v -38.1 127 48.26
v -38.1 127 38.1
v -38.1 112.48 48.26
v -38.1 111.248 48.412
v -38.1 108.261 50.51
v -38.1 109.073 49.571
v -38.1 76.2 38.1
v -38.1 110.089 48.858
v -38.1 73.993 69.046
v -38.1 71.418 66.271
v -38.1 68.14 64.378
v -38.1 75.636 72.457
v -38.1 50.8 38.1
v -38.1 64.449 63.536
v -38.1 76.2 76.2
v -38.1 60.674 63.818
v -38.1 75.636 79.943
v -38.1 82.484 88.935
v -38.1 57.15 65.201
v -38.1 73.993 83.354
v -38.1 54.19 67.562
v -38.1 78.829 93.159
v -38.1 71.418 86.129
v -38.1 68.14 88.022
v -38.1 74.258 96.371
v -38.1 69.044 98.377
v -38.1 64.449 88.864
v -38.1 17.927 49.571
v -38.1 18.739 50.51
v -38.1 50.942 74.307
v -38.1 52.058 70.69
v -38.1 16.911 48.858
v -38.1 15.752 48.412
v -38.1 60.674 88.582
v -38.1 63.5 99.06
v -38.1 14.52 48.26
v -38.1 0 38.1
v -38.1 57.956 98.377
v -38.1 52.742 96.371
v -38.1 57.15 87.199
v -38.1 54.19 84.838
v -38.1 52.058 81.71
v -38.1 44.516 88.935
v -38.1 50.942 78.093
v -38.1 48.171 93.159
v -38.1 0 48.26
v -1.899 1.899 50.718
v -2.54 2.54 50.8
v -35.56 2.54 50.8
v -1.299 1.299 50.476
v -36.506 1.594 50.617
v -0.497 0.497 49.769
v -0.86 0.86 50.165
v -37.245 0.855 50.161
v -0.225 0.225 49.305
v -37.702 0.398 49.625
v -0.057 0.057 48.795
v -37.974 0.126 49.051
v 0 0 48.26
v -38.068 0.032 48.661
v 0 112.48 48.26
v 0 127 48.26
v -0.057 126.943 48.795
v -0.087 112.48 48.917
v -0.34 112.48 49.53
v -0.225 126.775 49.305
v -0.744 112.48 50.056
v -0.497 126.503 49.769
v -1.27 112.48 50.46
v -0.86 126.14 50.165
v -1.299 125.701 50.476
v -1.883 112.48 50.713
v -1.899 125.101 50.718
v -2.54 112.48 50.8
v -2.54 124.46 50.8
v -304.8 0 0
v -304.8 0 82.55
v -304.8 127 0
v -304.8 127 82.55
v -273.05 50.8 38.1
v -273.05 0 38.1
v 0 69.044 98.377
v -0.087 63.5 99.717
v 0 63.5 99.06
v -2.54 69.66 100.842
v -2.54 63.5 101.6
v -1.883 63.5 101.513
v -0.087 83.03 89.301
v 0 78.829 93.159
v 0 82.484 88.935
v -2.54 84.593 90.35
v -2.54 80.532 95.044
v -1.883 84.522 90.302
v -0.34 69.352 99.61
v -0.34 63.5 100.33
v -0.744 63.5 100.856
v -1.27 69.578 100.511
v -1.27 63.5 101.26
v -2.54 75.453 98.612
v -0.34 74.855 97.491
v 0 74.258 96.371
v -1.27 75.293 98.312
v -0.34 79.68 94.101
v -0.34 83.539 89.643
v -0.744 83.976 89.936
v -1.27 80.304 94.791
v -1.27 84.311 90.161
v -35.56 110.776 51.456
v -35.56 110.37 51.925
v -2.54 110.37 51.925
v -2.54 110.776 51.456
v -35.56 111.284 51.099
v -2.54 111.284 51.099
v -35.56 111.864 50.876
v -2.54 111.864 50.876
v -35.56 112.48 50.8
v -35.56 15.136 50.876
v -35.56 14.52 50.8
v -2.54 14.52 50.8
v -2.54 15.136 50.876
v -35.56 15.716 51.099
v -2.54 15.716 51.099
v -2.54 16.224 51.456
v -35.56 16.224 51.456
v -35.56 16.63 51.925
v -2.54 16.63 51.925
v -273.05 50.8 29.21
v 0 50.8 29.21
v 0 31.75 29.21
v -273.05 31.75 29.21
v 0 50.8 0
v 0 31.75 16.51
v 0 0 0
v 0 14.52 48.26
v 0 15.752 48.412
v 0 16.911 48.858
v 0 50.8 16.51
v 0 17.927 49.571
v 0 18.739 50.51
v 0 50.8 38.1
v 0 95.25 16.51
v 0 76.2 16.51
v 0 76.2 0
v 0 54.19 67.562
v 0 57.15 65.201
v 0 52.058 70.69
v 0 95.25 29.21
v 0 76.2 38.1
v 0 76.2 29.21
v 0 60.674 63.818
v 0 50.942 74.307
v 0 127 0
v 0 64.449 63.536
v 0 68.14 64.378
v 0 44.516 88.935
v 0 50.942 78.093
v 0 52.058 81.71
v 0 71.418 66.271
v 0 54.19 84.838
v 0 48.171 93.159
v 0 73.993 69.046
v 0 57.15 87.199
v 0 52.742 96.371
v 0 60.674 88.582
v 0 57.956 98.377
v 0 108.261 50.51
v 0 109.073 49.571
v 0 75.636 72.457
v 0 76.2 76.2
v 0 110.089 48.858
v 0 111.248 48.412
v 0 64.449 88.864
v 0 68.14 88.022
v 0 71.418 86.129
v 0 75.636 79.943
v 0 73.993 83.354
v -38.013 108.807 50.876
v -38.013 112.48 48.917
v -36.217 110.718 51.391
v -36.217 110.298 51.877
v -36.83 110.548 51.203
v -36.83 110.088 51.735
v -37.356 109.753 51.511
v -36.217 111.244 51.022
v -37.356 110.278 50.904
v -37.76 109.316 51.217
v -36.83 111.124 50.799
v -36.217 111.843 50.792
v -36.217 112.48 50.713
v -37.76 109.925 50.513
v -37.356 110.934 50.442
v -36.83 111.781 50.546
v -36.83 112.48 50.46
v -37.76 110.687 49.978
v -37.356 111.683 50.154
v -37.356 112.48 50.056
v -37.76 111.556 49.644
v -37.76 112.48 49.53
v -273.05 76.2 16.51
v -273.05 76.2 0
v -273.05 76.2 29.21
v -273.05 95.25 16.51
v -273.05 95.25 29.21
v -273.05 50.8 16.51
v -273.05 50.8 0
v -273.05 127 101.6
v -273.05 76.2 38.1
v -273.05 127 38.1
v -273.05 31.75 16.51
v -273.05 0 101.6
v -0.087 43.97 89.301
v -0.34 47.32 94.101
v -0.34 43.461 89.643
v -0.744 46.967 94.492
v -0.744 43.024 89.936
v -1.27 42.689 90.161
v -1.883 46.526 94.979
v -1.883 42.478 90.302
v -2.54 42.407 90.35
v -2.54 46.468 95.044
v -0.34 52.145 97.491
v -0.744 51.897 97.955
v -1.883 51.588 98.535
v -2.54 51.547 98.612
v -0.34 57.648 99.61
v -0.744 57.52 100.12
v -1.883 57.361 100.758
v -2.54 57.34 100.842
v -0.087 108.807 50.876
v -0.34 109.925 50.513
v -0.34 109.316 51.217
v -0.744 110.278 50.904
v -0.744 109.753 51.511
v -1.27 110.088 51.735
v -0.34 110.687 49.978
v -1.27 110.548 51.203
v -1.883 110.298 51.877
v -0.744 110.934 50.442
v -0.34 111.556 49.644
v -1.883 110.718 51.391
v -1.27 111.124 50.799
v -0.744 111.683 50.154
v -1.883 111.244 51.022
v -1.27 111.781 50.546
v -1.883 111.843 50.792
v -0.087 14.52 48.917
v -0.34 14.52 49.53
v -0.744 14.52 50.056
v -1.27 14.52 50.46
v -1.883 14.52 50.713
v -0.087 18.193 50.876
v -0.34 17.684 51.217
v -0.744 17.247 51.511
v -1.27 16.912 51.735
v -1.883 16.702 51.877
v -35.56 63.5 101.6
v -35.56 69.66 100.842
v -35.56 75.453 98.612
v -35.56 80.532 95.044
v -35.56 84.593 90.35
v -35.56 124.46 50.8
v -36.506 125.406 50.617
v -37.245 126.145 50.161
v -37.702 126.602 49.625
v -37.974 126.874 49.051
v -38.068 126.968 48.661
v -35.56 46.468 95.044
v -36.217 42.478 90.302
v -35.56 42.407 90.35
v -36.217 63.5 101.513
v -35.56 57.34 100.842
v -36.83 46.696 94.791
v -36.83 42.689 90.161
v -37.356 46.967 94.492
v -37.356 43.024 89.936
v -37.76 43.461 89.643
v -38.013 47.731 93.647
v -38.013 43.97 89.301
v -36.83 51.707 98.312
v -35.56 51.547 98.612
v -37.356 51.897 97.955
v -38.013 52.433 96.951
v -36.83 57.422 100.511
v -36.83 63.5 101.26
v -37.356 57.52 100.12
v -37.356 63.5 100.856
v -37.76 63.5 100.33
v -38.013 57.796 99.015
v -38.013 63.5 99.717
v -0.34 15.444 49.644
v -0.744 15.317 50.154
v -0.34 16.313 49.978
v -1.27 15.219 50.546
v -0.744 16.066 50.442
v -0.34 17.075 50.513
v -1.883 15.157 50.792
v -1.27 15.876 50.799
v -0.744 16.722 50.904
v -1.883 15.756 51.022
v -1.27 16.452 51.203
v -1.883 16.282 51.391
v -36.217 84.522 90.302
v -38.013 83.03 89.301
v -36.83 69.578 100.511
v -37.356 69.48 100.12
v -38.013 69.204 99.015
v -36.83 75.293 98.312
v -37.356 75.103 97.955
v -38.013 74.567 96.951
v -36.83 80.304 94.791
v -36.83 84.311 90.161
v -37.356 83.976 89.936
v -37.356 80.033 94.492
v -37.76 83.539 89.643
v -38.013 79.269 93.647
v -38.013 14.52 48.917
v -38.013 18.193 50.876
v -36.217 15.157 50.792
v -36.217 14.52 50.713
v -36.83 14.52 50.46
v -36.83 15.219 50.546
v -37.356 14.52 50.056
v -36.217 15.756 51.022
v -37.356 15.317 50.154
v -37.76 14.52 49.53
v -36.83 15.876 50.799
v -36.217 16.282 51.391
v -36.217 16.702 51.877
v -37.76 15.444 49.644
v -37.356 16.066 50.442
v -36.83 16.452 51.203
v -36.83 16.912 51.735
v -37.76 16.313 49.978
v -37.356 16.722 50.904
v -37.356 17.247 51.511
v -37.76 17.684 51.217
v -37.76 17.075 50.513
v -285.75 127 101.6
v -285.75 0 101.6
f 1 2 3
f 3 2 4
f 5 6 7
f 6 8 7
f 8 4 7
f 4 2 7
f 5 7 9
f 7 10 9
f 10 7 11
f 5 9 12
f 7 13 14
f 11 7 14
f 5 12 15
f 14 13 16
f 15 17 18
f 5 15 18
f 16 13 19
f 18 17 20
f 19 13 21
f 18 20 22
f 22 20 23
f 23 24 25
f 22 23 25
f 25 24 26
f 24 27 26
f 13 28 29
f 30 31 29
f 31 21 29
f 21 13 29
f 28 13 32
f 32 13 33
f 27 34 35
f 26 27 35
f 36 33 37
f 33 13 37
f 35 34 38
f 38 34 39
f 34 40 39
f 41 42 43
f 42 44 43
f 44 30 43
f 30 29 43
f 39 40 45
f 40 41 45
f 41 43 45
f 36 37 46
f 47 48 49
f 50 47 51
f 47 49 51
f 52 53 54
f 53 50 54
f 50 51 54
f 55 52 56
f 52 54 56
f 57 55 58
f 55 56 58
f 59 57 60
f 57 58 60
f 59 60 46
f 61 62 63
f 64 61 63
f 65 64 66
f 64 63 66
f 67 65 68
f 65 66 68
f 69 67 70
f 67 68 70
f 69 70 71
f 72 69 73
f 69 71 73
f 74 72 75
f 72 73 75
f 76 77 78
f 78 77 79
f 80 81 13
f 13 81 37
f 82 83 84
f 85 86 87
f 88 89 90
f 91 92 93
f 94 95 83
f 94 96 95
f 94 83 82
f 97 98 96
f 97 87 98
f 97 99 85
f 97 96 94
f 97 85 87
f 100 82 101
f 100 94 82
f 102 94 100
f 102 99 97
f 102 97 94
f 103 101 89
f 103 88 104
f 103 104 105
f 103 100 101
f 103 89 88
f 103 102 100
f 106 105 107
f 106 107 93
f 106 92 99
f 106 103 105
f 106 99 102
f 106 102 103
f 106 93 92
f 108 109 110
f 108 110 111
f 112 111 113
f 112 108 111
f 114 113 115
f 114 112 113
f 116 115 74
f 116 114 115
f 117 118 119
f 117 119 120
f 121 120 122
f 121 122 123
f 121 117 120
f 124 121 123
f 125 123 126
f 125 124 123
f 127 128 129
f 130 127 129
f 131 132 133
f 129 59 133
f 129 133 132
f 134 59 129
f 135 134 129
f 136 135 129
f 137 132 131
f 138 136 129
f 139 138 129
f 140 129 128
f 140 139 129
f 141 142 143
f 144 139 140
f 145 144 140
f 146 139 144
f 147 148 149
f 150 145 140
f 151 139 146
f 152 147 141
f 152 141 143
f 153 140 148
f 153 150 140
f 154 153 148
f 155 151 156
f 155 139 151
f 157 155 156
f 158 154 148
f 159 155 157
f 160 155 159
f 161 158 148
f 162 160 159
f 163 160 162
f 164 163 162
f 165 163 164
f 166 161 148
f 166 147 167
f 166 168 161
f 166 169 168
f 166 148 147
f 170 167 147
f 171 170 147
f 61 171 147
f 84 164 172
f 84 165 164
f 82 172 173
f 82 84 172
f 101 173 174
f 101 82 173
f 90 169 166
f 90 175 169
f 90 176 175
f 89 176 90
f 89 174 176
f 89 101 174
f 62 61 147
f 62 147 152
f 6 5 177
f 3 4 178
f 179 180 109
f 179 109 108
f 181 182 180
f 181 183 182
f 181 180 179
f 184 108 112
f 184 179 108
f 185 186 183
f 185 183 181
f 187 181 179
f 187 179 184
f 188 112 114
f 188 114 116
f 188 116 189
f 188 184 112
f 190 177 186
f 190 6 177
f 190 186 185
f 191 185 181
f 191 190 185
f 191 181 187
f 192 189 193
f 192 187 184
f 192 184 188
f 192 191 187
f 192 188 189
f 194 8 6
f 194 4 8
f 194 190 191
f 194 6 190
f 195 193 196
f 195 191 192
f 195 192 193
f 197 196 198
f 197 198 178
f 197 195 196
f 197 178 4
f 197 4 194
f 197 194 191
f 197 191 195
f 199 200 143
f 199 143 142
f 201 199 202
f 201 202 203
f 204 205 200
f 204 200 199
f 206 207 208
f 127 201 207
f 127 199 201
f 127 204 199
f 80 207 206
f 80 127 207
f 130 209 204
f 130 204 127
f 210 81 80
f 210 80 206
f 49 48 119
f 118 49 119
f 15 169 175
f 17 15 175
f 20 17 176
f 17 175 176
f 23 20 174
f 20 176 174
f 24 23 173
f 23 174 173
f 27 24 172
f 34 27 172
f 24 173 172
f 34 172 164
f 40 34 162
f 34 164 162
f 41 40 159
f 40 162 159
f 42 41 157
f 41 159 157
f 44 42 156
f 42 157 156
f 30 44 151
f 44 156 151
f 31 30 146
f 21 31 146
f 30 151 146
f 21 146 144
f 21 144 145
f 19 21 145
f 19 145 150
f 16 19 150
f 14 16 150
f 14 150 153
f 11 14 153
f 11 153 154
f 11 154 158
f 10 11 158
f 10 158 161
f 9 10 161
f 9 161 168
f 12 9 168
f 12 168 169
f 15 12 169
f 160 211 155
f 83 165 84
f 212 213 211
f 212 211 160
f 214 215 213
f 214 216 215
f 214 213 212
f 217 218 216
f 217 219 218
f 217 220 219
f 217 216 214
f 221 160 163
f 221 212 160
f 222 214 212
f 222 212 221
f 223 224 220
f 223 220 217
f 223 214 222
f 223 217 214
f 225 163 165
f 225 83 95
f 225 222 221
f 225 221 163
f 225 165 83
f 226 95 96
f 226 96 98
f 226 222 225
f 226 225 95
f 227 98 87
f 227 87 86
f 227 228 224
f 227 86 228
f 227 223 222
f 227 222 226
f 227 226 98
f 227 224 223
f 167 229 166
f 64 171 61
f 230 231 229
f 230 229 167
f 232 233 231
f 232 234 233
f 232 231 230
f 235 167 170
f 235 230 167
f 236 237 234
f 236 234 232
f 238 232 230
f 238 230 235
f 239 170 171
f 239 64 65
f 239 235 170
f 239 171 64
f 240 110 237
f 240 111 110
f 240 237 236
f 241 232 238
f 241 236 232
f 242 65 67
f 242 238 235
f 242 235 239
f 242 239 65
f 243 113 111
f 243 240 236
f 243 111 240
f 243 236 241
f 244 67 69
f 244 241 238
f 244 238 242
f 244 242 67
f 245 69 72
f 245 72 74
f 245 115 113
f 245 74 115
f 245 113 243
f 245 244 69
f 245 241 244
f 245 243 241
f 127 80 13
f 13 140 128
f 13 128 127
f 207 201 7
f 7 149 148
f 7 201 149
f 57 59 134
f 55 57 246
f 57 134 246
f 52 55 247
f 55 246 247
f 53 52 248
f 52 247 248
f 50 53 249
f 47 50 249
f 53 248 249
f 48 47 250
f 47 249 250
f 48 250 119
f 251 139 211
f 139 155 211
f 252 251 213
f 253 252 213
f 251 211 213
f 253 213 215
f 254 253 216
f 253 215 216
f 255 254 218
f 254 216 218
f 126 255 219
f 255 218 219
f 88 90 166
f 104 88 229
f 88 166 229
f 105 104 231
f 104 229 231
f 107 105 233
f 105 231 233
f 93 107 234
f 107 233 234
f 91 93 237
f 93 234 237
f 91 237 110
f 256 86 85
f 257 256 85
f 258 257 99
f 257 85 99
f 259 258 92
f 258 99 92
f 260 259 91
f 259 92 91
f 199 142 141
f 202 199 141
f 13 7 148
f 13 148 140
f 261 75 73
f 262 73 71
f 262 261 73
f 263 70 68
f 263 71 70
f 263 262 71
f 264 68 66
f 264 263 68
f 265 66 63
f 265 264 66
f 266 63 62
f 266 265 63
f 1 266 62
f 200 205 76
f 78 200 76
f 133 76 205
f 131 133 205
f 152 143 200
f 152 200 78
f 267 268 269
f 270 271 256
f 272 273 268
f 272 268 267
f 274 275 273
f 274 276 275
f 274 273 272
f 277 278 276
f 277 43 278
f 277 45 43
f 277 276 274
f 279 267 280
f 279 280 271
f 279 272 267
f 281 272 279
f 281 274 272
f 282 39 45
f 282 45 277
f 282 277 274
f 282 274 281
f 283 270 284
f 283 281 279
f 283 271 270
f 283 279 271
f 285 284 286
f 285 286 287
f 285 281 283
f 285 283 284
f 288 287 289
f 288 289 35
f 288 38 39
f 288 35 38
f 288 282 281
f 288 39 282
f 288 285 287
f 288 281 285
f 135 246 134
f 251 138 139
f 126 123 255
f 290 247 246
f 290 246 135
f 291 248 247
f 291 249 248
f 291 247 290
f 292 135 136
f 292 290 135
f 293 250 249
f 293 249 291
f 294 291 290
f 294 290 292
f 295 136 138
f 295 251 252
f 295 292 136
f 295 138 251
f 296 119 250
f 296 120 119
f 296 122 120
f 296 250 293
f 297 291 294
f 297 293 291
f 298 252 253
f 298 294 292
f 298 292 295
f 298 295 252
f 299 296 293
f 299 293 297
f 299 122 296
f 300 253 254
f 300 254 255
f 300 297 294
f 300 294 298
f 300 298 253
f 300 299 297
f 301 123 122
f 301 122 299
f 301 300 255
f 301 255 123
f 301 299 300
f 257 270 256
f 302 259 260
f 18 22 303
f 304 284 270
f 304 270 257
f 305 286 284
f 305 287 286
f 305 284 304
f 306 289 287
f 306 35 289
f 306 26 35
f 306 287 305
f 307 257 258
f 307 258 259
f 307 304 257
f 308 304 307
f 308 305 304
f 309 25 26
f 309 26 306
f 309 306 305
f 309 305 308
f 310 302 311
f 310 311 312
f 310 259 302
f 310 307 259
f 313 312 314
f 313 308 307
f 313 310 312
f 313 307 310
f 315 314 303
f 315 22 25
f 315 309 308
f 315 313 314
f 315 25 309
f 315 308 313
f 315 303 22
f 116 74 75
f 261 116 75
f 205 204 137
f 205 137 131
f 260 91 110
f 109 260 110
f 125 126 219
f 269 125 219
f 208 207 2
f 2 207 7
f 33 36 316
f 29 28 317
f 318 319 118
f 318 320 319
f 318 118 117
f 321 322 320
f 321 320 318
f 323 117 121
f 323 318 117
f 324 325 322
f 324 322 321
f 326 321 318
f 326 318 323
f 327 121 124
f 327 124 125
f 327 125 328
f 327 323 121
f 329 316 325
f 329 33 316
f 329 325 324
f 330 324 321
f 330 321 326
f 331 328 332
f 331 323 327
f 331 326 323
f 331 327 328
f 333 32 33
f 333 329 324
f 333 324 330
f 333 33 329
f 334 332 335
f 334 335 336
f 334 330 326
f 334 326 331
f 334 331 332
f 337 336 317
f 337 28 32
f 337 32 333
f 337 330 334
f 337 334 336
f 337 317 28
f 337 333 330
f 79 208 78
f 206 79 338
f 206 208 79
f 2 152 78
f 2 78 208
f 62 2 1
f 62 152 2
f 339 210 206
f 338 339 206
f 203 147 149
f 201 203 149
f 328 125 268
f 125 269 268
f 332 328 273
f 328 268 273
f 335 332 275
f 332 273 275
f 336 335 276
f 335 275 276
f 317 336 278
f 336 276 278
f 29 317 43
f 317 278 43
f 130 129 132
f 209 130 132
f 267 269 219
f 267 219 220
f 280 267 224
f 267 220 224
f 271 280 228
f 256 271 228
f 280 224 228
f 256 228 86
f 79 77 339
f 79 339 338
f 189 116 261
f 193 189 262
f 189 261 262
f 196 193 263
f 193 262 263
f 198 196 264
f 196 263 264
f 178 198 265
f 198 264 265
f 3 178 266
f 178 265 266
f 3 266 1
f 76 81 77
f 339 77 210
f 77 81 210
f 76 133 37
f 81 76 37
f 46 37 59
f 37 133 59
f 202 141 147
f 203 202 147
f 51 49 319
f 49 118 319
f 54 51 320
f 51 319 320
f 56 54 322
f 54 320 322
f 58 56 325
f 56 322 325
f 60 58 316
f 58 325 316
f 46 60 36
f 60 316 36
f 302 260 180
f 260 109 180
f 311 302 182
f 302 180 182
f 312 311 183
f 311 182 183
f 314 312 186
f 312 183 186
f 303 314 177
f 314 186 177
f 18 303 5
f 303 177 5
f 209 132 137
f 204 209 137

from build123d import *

# Parameters (mm, degrees)
F0_W     = 127
F0_H     = 101.6
F1_DEPTH = 304.8
F2_W     = 234.95
F2_H     = 63.5
F3_DEPTH = 127.001
F4_R     = 12.7
F5_DEPTH = 273.05
F6_SIZE  = 19.05
F7_F1_R  = 2.54
F7_F2_R  = 2.54


with BuildPart() as f1:
    # F0 (on Right) → F1 (new body)
    with BuildSketch(Plane.YZ):
        with Locations((63.5, 50.8)):
            Rectangle(F0_W, F0_H)
    extrude(amount=-F1_DEPTH)

    # F2 (on face) → F3 (cut, through all)
    with BuildSketch(Plane.XZ):
        with Locations((-155.575, 69.85)):
            Rectangle(F2_W, F2_H)
    extrude(amount=-F3_DEPTH, mode=Mode.SUBTRACT)

    # F4 (on face) → F5 (cut, through all)
    with BuildSketch(Plane.YZ):
        with Locations((63.5, 76.2)):
            Circle(F4_R)
        Polygon((50.8, 16.51), (50.8, 0), (76.2, 0), (76.2, 16.51), (95.25, 16.51), (95.25, 29.21), (76.2, 29.21), (76.2, 38.1), (50.8, 38.1), (50.8, 29.21), (31.75, 29.21), (31.75, 16.51), align=None)
        with BuildLine():
            Line((0, 101.6), (0, 50.8))
            Line((0, 50.8), (15.875, 50.8))
            Line((15.875, 50.8), (42.4065743945, 90.3501730104))
            ThreePointArc((42.4065743945, 90.3501730104), (51.5470588235, 98.6117647059), (63.5, 101.6))
            Line((63.5, 101.6), (0, 101.6))
        make_face()
        with BuildLine():
            Line((127, 101.6), (63.5, 101.6))
            ThreePointArc((63.5, 101.6), (75.4529411765, 98.6117647059), (84.5934256055, 90.3501730104))
            Line((84.5934256055, 90.3501730104), (111.125, 50.8))
            Line((111.125, 50.8), (127, 50.8))
            Line((127, 50.8), (127, 101.6))
        make_face()
    extrude(amount=-F5_DEPTH, mode=Mode.SUBTRACT)

    # F6
    f6_edges = [f1.edges().sort_by_distance(p)[0] for p in [
        (-304.8, 63.5, 101.6),
    ]]
    chamfer(f6_edges, length=F6_SIZE)

    # F7: fillet of radius 2.54 on 6 edges, made by hand

    # F7_f1
    f7_f1_edges = [f1.edges().sort_by_distance(p)[0] for p in [
        (-19.05, 15.875, 50.8),
        (-19.05, 111.125, 50.8),
    ]]
    fillet(f7_f1_edges, radius=F7_F1_R)

    # F7_f2
    f7_f2_edges = [f1.edges().sort_by_distance(p)[0] for p in [
        (0, 29.5181251442, 71.1375778547),
        (-38.1, 29.5181251442, 71.1375778547),
        (-19.05, 127, 50.8),
        (-19.05, 0, 50.8),
        (-38.1, 63.5, 101.6),
        (-38.1, 97.4818748558, 71.1375778547),
        (0, 63.5, 101.6),
        (0, 97.4818748558, 71.1375778547),
        (0, 111.284372549, 51.0988235294),
        (-38.1, 111.284372549, 51.0988235294),
        (-38.1, 15.715627451, 51.0988235294),
        (0, 15.715627451, 51.0988235294),
    ]]
    fillet(f7_f2_edges, radius=F7_F2_R)


solid = f1.part
